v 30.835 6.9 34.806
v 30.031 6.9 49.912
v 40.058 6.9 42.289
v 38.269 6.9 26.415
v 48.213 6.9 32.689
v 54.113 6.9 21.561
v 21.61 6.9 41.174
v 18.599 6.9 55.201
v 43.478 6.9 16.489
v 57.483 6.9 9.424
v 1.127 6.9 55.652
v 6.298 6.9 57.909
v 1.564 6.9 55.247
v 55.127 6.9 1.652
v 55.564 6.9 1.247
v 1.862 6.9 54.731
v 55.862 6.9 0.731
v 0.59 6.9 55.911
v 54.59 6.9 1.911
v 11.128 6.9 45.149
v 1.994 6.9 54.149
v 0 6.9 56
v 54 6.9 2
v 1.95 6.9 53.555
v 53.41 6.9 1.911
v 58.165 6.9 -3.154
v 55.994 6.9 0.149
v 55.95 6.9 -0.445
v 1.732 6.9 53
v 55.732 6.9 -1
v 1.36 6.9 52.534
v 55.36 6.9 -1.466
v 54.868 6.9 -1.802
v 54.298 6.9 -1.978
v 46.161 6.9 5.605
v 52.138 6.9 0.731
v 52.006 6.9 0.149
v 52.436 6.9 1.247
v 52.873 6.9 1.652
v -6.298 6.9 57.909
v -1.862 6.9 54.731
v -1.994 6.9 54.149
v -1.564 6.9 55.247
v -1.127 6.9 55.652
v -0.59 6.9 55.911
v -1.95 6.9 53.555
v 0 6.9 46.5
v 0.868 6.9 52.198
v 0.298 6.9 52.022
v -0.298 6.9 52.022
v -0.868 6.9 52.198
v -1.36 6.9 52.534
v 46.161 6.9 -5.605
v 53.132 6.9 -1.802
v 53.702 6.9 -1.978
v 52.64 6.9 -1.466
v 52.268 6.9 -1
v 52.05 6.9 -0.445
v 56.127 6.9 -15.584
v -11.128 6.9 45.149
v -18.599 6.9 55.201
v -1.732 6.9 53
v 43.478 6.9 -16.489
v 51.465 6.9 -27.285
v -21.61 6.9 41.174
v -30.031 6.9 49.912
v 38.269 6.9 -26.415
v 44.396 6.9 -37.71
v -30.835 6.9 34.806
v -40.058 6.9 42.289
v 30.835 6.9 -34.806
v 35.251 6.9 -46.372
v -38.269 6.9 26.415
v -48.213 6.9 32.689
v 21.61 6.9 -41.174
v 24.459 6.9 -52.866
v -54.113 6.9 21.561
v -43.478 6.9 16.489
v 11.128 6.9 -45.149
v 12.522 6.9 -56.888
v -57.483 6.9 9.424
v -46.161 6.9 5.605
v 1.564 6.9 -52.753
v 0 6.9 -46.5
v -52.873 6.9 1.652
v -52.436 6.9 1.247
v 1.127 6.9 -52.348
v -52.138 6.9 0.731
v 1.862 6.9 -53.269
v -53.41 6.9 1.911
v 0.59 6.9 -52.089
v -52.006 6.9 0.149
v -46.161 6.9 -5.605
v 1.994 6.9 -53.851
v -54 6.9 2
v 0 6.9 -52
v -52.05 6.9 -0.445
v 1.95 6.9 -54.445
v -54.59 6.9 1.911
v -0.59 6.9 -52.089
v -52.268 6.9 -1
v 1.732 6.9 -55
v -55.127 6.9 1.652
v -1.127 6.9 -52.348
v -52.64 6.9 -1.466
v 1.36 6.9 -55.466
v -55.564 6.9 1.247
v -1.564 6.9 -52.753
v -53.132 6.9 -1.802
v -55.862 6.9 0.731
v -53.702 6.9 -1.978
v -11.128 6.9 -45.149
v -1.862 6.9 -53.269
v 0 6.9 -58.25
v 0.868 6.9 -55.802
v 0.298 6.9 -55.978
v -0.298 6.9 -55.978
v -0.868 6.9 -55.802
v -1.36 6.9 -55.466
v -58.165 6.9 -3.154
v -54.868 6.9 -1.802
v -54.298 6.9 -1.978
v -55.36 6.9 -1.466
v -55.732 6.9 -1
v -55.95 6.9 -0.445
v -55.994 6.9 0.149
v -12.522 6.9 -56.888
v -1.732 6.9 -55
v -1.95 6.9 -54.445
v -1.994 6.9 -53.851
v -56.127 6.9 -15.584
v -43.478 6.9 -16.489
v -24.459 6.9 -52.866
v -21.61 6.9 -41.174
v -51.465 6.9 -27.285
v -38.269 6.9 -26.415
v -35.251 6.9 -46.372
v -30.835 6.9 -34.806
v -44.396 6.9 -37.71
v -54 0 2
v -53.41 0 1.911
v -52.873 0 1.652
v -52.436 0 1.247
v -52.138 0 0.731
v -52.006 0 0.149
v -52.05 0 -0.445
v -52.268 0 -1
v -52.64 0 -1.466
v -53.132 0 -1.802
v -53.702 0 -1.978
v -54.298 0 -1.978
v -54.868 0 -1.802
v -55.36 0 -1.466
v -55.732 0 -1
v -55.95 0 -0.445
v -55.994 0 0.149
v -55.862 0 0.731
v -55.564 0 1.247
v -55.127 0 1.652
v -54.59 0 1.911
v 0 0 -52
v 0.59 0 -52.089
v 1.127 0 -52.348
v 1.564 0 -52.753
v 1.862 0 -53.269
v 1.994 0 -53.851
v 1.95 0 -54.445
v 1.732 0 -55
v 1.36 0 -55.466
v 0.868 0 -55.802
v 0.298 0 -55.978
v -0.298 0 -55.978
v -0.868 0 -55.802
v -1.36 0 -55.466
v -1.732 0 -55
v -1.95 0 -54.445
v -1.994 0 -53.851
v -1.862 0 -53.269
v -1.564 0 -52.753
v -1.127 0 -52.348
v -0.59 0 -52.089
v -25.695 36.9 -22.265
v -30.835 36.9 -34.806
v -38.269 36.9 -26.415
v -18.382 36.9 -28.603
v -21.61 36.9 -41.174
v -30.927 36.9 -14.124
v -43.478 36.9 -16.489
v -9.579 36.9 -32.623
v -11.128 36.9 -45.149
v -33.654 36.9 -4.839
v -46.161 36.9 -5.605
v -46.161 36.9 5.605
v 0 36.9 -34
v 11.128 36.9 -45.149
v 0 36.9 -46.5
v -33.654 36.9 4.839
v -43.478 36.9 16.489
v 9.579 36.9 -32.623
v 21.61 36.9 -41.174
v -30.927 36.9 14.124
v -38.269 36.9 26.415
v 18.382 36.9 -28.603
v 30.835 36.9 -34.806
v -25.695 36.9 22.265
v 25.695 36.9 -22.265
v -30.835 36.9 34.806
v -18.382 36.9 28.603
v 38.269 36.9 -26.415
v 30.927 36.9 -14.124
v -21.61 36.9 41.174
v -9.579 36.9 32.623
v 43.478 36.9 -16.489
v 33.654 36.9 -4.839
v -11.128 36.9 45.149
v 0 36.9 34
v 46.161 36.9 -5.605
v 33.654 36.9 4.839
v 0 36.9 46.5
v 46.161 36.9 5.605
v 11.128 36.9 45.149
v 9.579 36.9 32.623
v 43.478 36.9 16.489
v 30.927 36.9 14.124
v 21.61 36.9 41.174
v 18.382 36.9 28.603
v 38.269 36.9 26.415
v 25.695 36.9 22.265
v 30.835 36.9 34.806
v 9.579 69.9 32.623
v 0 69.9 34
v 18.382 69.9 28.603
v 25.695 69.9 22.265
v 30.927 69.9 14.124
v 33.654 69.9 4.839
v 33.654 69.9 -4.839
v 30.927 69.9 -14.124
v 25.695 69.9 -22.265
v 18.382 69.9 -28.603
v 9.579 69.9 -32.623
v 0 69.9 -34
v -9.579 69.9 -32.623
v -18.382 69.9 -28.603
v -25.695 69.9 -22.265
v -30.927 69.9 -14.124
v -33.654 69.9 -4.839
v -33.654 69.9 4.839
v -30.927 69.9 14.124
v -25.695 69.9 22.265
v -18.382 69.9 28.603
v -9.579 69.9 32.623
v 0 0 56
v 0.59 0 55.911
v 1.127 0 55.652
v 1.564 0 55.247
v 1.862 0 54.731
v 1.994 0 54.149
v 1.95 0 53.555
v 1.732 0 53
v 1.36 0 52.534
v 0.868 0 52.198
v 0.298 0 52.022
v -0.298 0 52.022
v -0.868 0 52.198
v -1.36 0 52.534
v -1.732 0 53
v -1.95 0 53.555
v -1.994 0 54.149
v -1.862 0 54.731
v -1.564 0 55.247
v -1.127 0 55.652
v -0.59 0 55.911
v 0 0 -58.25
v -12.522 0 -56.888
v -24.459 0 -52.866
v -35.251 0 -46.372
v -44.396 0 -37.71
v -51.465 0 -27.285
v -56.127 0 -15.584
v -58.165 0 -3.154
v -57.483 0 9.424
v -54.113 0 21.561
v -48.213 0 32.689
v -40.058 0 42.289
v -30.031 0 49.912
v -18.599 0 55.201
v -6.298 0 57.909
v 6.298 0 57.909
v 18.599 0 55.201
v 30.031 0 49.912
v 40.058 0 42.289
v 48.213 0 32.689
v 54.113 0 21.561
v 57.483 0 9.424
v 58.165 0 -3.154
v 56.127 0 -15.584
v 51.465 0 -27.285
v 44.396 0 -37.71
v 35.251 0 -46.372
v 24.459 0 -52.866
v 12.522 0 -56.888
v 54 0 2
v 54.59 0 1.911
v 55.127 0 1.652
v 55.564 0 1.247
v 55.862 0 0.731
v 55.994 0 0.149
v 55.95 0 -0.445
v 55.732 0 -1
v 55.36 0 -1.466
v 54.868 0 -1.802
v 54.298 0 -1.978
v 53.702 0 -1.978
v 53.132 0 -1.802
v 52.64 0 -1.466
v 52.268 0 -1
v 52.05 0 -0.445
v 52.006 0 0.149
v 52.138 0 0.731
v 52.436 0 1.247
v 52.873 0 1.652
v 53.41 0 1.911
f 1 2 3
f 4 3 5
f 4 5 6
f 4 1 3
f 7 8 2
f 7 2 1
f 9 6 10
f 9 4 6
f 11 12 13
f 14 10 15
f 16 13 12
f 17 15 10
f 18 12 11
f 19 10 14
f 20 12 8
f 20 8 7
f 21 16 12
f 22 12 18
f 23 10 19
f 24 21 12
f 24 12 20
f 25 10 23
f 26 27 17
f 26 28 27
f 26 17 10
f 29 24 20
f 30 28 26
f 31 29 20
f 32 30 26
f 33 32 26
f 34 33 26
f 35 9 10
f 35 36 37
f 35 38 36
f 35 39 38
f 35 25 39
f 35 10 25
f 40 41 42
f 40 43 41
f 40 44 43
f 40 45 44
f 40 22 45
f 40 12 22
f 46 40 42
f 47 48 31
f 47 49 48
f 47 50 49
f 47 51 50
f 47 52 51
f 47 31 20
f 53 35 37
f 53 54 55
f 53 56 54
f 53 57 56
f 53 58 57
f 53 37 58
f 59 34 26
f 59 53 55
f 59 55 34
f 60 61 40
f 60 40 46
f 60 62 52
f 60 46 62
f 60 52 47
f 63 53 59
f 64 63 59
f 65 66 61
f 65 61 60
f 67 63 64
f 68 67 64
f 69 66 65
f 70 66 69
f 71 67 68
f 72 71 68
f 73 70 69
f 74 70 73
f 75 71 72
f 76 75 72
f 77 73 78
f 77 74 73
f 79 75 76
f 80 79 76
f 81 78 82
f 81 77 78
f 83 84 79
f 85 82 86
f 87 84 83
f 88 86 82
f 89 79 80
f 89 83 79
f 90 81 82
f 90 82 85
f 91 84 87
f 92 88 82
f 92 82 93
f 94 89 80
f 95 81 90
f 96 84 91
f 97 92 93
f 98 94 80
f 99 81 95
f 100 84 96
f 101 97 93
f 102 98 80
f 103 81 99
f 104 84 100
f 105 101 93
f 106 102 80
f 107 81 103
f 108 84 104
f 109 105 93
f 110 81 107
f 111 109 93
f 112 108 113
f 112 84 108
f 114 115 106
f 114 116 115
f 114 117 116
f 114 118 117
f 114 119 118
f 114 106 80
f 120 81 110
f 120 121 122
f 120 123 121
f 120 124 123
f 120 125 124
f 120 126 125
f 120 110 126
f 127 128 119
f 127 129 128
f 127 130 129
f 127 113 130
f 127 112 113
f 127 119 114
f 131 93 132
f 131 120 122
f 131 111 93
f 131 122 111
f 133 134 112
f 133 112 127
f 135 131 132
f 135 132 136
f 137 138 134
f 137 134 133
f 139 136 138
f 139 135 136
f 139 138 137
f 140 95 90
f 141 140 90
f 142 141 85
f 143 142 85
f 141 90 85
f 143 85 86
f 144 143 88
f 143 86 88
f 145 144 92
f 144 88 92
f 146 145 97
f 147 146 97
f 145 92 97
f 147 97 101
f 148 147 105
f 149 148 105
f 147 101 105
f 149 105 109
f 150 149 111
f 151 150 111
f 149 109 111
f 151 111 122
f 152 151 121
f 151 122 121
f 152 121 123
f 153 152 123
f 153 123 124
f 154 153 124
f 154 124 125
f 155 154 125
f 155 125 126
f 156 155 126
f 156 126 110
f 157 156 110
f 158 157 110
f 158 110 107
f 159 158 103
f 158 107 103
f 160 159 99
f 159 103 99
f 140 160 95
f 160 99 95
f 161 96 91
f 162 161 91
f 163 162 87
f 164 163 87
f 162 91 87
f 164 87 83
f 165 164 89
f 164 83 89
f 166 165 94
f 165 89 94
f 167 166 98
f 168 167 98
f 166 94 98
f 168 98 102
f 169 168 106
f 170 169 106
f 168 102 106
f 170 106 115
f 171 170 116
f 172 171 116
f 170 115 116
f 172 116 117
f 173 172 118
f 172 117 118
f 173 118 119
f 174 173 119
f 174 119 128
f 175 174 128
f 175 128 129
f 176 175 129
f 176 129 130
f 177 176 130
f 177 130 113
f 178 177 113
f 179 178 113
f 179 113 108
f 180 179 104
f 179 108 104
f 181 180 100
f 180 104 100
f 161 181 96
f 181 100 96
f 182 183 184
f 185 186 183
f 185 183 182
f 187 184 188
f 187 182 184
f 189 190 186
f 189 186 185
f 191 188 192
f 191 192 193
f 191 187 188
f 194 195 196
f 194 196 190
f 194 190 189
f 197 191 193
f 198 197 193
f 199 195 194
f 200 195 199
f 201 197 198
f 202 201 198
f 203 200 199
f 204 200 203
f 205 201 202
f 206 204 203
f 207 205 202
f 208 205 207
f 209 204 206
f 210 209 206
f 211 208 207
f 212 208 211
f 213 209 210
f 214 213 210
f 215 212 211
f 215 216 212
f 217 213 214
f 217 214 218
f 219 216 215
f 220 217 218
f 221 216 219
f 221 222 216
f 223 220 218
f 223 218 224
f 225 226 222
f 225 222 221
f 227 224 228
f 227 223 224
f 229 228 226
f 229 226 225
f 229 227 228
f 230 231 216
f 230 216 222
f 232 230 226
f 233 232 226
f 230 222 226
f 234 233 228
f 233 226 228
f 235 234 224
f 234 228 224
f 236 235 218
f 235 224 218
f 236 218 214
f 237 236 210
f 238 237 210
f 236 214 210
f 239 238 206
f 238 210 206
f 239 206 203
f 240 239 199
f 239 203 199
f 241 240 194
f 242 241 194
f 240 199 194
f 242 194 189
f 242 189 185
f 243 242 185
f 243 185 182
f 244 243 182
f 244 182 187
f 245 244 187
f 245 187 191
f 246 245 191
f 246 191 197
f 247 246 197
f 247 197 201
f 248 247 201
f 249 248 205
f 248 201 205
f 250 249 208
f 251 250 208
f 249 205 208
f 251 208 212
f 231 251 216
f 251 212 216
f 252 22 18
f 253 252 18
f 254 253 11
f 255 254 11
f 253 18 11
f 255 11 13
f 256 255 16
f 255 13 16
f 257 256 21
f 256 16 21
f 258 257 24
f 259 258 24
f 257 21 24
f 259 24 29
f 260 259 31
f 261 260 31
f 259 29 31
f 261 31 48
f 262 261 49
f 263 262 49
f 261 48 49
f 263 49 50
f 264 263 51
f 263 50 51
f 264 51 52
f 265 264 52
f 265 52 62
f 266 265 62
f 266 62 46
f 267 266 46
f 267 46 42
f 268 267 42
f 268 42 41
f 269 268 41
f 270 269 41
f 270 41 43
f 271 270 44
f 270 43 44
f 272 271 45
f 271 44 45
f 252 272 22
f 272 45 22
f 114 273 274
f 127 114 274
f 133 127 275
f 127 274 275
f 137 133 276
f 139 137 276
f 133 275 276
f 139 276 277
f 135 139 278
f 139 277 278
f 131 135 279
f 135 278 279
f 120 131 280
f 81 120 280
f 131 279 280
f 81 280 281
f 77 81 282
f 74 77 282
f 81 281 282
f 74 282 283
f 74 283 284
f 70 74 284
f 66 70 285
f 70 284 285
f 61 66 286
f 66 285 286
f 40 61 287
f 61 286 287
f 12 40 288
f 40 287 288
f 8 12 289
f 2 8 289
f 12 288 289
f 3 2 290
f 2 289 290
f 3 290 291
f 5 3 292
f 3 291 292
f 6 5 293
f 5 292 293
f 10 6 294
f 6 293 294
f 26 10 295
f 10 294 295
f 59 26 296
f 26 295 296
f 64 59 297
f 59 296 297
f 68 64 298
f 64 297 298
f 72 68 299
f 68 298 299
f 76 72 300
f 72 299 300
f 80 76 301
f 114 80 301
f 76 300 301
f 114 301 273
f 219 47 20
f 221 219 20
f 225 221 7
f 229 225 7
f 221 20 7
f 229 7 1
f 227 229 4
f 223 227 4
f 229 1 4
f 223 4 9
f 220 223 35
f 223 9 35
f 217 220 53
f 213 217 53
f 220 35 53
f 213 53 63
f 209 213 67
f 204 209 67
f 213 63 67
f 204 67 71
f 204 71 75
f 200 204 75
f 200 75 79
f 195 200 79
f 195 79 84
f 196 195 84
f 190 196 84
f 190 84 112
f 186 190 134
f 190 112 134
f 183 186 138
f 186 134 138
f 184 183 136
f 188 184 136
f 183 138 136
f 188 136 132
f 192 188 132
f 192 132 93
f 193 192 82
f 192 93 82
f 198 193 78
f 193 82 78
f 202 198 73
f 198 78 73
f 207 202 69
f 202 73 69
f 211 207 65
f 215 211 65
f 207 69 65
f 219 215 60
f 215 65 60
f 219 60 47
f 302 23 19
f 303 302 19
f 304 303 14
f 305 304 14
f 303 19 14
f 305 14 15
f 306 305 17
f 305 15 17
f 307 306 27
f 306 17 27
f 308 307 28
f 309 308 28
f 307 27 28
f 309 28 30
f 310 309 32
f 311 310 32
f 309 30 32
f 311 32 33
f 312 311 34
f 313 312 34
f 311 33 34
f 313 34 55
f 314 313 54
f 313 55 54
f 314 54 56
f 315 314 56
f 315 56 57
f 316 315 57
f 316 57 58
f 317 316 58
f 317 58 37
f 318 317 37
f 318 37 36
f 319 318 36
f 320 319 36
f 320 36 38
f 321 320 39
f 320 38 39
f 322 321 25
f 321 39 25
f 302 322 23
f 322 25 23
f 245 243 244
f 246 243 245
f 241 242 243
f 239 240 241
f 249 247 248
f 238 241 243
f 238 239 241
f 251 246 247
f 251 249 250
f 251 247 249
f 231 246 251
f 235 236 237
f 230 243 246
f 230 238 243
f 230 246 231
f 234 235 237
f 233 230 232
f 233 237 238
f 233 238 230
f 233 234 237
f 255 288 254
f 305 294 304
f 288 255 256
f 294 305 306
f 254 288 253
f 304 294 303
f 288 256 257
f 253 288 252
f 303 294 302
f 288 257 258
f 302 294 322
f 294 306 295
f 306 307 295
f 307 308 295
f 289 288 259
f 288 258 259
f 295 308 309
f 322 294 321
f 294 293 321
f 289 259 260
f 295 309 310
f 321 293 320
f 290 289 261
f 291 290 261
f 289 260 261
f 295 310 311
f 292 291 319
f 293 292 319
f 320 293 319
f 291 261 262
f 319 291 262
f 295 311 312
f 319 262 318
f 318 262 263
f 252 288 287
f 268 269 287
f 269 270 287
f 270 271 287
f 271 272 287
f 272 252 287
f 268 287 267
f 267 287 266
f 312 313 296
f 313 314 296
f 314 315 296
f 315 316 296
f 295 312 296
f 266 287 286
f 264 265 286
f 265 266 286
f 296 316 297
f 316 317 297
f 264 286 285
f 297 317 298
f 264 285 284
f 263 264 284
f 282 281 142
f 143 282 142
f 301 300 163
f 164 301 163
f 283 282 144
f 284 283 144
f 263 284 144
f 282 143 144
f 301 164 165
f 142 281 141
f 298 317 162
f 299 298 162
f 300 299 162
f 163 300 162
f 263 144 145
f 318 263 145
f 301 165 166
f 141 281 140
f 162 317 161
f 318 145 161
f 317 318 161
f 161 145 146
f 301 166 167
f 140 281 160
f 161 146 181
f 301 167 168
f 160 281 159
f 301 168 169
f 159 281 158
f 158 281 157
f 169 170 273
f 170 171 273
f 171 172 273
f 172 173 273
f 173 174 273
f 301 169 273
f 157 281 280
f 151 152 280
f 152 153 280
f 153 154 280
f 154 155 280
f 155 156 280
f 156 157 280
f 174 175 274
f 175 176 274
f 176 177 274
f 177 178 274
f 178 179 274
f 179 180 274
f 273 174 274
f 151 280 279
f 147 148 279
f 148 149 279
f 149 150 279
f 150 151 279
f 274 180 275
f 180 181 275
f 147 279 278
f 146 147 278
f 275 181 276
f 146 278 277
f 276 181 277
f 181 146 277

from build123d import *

# Parameters (mm, degrees)
SKETCH1_R           = 58.25
BOSS_EXTRUDE1_DEPTH = 6.9
SKETCH2_R           = 2
CUT_EXTRUDE1_DEPTH  = 6.9
SKETCH3_R           = 46.5
BOSS_EXTRUDE2_DEPTH = 30
SKETCH4_R           = 34
BOSS_EXTRUDE3_DEPTH = 33


with BuildPart() as part:
    # Sketch1 → Boss-Extrude1 (new body)
    with BuildSketch(Plane(origin=(0, 0, 0), x_dir=(1, 0, 0), z_dir=(0, 1, 0))):
        with Locations(Location((0, 0, 0), (0, 0, 90))):
            Circle(SKETCH1_R)
    extrude(amount=BOSS_EXTRUDE1_DEPTH)

    # Sketch2 → Cut-Extrude1 (cut)
    with BuildSketch(Plane(origin=(0, 6.9, 0), x_dir=(1, 0, 0), z_dir=(0, 1, 0))):
        with Locations(Location((0, 54, 0), (0, 0, 270))):
            Circle(SKETCH2_R)
        with Locations(Location((-54, 0, 0), (0, 0, 270))):
            Circle(SKETCH2_R)
        with Locations(Location((0, -54, 0), (0, 0, 270))):
            Circle(SKETCH2_R)
        with Locations(Location((54, 0, 0), (0, 0, 270))):
            Circle(SKETCH2_R)
    extrude(amount=-CUT_EXTRUDE1_DEPTH, mode=Mode.SUBTRACT)

    # Sketch3 → Boss-Extrude2 (add)
    with BuildSketch(Plane(origin=(0, 6.9, 0), x_dir=(1, 0, 0), z_dir=(0, 1, 0))):
        with Locations(Location((0, 0, 0), (0, 0, 270))):
            Circle(SKETCH3_R)
    extrude(amount=BOSS_EXTRUDE2_DEPTH)

    # Sketch4 → Boss-Extrude3 (add)
    with BuildSketch(Plane(origin=(0, 36.9, 0), x_dir=(1, 0, 0), z_dir=(0, 1, 0))):
        with Locations(Location((0, 0, 0), (0, 0, 270))):
            Circle(SKETCH4_R)
    extrude(amount=BOSS_EXTRUDE3_DEPTH)


solid = part.part
